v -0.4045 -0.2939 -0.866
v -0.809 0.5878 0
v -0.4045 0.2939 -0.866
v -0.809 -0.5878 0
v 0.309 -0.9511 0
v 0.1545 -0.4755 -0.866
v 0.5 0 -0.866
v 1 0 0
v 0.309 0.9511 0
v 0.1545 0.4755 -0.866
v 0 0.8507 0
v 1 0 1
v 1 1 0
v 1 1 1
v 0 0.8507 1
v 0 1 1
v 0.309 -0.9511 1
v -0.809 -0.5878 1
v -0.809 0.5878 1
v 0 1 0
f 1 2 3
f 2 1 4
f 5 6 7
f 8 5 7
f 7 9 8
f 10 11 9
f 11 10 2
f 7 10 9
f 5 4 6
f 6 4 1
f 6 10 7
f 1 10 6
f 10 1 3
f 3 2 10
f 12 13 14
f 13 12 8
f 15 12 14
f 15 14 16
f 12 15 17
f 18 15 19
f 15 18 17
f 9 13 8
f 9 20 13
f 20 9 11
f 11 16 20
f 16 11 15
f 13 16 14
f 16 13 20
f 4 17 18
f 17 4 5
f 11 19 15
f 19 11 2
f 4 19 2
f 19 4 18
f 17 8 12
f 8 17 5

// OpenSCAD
minkowski();//parameter
//description
hull();//parameter
//description
resize();//parameter
//description
children();//parameter
//description
echo();//parameter
//description
for();//parameter
//description
intersection_for();//parameter
//description
if(false) { cube(); } else { sphere(); }//parameter
//description
union();//parameter
//description
difference();//parameter
//description
intersection();//parameter
//description
linear_extrude();//parameter
//description
rotate_extrude();//parameter
//description
import();//parameter
//description
group();//parameter
//description
cube();//parameter
//description
sphere();//parameter
//description
cylinder();//parameter
//description
polyhedron();//parameter
//description
square();//parameter
//description
circle();//parameter
//description
polygon();//parameter
//description
projection();//parameter
//description
render();//parameter
//description
surface();//parameter
//description
scale();//parameter
//description
rotate();//parameter
//description
mirror();//parameter
//description
translate();//parameter
//description
multmatrix();//parameter
//description
color();//parameter
//description
offset();//parameter
//description
text();
